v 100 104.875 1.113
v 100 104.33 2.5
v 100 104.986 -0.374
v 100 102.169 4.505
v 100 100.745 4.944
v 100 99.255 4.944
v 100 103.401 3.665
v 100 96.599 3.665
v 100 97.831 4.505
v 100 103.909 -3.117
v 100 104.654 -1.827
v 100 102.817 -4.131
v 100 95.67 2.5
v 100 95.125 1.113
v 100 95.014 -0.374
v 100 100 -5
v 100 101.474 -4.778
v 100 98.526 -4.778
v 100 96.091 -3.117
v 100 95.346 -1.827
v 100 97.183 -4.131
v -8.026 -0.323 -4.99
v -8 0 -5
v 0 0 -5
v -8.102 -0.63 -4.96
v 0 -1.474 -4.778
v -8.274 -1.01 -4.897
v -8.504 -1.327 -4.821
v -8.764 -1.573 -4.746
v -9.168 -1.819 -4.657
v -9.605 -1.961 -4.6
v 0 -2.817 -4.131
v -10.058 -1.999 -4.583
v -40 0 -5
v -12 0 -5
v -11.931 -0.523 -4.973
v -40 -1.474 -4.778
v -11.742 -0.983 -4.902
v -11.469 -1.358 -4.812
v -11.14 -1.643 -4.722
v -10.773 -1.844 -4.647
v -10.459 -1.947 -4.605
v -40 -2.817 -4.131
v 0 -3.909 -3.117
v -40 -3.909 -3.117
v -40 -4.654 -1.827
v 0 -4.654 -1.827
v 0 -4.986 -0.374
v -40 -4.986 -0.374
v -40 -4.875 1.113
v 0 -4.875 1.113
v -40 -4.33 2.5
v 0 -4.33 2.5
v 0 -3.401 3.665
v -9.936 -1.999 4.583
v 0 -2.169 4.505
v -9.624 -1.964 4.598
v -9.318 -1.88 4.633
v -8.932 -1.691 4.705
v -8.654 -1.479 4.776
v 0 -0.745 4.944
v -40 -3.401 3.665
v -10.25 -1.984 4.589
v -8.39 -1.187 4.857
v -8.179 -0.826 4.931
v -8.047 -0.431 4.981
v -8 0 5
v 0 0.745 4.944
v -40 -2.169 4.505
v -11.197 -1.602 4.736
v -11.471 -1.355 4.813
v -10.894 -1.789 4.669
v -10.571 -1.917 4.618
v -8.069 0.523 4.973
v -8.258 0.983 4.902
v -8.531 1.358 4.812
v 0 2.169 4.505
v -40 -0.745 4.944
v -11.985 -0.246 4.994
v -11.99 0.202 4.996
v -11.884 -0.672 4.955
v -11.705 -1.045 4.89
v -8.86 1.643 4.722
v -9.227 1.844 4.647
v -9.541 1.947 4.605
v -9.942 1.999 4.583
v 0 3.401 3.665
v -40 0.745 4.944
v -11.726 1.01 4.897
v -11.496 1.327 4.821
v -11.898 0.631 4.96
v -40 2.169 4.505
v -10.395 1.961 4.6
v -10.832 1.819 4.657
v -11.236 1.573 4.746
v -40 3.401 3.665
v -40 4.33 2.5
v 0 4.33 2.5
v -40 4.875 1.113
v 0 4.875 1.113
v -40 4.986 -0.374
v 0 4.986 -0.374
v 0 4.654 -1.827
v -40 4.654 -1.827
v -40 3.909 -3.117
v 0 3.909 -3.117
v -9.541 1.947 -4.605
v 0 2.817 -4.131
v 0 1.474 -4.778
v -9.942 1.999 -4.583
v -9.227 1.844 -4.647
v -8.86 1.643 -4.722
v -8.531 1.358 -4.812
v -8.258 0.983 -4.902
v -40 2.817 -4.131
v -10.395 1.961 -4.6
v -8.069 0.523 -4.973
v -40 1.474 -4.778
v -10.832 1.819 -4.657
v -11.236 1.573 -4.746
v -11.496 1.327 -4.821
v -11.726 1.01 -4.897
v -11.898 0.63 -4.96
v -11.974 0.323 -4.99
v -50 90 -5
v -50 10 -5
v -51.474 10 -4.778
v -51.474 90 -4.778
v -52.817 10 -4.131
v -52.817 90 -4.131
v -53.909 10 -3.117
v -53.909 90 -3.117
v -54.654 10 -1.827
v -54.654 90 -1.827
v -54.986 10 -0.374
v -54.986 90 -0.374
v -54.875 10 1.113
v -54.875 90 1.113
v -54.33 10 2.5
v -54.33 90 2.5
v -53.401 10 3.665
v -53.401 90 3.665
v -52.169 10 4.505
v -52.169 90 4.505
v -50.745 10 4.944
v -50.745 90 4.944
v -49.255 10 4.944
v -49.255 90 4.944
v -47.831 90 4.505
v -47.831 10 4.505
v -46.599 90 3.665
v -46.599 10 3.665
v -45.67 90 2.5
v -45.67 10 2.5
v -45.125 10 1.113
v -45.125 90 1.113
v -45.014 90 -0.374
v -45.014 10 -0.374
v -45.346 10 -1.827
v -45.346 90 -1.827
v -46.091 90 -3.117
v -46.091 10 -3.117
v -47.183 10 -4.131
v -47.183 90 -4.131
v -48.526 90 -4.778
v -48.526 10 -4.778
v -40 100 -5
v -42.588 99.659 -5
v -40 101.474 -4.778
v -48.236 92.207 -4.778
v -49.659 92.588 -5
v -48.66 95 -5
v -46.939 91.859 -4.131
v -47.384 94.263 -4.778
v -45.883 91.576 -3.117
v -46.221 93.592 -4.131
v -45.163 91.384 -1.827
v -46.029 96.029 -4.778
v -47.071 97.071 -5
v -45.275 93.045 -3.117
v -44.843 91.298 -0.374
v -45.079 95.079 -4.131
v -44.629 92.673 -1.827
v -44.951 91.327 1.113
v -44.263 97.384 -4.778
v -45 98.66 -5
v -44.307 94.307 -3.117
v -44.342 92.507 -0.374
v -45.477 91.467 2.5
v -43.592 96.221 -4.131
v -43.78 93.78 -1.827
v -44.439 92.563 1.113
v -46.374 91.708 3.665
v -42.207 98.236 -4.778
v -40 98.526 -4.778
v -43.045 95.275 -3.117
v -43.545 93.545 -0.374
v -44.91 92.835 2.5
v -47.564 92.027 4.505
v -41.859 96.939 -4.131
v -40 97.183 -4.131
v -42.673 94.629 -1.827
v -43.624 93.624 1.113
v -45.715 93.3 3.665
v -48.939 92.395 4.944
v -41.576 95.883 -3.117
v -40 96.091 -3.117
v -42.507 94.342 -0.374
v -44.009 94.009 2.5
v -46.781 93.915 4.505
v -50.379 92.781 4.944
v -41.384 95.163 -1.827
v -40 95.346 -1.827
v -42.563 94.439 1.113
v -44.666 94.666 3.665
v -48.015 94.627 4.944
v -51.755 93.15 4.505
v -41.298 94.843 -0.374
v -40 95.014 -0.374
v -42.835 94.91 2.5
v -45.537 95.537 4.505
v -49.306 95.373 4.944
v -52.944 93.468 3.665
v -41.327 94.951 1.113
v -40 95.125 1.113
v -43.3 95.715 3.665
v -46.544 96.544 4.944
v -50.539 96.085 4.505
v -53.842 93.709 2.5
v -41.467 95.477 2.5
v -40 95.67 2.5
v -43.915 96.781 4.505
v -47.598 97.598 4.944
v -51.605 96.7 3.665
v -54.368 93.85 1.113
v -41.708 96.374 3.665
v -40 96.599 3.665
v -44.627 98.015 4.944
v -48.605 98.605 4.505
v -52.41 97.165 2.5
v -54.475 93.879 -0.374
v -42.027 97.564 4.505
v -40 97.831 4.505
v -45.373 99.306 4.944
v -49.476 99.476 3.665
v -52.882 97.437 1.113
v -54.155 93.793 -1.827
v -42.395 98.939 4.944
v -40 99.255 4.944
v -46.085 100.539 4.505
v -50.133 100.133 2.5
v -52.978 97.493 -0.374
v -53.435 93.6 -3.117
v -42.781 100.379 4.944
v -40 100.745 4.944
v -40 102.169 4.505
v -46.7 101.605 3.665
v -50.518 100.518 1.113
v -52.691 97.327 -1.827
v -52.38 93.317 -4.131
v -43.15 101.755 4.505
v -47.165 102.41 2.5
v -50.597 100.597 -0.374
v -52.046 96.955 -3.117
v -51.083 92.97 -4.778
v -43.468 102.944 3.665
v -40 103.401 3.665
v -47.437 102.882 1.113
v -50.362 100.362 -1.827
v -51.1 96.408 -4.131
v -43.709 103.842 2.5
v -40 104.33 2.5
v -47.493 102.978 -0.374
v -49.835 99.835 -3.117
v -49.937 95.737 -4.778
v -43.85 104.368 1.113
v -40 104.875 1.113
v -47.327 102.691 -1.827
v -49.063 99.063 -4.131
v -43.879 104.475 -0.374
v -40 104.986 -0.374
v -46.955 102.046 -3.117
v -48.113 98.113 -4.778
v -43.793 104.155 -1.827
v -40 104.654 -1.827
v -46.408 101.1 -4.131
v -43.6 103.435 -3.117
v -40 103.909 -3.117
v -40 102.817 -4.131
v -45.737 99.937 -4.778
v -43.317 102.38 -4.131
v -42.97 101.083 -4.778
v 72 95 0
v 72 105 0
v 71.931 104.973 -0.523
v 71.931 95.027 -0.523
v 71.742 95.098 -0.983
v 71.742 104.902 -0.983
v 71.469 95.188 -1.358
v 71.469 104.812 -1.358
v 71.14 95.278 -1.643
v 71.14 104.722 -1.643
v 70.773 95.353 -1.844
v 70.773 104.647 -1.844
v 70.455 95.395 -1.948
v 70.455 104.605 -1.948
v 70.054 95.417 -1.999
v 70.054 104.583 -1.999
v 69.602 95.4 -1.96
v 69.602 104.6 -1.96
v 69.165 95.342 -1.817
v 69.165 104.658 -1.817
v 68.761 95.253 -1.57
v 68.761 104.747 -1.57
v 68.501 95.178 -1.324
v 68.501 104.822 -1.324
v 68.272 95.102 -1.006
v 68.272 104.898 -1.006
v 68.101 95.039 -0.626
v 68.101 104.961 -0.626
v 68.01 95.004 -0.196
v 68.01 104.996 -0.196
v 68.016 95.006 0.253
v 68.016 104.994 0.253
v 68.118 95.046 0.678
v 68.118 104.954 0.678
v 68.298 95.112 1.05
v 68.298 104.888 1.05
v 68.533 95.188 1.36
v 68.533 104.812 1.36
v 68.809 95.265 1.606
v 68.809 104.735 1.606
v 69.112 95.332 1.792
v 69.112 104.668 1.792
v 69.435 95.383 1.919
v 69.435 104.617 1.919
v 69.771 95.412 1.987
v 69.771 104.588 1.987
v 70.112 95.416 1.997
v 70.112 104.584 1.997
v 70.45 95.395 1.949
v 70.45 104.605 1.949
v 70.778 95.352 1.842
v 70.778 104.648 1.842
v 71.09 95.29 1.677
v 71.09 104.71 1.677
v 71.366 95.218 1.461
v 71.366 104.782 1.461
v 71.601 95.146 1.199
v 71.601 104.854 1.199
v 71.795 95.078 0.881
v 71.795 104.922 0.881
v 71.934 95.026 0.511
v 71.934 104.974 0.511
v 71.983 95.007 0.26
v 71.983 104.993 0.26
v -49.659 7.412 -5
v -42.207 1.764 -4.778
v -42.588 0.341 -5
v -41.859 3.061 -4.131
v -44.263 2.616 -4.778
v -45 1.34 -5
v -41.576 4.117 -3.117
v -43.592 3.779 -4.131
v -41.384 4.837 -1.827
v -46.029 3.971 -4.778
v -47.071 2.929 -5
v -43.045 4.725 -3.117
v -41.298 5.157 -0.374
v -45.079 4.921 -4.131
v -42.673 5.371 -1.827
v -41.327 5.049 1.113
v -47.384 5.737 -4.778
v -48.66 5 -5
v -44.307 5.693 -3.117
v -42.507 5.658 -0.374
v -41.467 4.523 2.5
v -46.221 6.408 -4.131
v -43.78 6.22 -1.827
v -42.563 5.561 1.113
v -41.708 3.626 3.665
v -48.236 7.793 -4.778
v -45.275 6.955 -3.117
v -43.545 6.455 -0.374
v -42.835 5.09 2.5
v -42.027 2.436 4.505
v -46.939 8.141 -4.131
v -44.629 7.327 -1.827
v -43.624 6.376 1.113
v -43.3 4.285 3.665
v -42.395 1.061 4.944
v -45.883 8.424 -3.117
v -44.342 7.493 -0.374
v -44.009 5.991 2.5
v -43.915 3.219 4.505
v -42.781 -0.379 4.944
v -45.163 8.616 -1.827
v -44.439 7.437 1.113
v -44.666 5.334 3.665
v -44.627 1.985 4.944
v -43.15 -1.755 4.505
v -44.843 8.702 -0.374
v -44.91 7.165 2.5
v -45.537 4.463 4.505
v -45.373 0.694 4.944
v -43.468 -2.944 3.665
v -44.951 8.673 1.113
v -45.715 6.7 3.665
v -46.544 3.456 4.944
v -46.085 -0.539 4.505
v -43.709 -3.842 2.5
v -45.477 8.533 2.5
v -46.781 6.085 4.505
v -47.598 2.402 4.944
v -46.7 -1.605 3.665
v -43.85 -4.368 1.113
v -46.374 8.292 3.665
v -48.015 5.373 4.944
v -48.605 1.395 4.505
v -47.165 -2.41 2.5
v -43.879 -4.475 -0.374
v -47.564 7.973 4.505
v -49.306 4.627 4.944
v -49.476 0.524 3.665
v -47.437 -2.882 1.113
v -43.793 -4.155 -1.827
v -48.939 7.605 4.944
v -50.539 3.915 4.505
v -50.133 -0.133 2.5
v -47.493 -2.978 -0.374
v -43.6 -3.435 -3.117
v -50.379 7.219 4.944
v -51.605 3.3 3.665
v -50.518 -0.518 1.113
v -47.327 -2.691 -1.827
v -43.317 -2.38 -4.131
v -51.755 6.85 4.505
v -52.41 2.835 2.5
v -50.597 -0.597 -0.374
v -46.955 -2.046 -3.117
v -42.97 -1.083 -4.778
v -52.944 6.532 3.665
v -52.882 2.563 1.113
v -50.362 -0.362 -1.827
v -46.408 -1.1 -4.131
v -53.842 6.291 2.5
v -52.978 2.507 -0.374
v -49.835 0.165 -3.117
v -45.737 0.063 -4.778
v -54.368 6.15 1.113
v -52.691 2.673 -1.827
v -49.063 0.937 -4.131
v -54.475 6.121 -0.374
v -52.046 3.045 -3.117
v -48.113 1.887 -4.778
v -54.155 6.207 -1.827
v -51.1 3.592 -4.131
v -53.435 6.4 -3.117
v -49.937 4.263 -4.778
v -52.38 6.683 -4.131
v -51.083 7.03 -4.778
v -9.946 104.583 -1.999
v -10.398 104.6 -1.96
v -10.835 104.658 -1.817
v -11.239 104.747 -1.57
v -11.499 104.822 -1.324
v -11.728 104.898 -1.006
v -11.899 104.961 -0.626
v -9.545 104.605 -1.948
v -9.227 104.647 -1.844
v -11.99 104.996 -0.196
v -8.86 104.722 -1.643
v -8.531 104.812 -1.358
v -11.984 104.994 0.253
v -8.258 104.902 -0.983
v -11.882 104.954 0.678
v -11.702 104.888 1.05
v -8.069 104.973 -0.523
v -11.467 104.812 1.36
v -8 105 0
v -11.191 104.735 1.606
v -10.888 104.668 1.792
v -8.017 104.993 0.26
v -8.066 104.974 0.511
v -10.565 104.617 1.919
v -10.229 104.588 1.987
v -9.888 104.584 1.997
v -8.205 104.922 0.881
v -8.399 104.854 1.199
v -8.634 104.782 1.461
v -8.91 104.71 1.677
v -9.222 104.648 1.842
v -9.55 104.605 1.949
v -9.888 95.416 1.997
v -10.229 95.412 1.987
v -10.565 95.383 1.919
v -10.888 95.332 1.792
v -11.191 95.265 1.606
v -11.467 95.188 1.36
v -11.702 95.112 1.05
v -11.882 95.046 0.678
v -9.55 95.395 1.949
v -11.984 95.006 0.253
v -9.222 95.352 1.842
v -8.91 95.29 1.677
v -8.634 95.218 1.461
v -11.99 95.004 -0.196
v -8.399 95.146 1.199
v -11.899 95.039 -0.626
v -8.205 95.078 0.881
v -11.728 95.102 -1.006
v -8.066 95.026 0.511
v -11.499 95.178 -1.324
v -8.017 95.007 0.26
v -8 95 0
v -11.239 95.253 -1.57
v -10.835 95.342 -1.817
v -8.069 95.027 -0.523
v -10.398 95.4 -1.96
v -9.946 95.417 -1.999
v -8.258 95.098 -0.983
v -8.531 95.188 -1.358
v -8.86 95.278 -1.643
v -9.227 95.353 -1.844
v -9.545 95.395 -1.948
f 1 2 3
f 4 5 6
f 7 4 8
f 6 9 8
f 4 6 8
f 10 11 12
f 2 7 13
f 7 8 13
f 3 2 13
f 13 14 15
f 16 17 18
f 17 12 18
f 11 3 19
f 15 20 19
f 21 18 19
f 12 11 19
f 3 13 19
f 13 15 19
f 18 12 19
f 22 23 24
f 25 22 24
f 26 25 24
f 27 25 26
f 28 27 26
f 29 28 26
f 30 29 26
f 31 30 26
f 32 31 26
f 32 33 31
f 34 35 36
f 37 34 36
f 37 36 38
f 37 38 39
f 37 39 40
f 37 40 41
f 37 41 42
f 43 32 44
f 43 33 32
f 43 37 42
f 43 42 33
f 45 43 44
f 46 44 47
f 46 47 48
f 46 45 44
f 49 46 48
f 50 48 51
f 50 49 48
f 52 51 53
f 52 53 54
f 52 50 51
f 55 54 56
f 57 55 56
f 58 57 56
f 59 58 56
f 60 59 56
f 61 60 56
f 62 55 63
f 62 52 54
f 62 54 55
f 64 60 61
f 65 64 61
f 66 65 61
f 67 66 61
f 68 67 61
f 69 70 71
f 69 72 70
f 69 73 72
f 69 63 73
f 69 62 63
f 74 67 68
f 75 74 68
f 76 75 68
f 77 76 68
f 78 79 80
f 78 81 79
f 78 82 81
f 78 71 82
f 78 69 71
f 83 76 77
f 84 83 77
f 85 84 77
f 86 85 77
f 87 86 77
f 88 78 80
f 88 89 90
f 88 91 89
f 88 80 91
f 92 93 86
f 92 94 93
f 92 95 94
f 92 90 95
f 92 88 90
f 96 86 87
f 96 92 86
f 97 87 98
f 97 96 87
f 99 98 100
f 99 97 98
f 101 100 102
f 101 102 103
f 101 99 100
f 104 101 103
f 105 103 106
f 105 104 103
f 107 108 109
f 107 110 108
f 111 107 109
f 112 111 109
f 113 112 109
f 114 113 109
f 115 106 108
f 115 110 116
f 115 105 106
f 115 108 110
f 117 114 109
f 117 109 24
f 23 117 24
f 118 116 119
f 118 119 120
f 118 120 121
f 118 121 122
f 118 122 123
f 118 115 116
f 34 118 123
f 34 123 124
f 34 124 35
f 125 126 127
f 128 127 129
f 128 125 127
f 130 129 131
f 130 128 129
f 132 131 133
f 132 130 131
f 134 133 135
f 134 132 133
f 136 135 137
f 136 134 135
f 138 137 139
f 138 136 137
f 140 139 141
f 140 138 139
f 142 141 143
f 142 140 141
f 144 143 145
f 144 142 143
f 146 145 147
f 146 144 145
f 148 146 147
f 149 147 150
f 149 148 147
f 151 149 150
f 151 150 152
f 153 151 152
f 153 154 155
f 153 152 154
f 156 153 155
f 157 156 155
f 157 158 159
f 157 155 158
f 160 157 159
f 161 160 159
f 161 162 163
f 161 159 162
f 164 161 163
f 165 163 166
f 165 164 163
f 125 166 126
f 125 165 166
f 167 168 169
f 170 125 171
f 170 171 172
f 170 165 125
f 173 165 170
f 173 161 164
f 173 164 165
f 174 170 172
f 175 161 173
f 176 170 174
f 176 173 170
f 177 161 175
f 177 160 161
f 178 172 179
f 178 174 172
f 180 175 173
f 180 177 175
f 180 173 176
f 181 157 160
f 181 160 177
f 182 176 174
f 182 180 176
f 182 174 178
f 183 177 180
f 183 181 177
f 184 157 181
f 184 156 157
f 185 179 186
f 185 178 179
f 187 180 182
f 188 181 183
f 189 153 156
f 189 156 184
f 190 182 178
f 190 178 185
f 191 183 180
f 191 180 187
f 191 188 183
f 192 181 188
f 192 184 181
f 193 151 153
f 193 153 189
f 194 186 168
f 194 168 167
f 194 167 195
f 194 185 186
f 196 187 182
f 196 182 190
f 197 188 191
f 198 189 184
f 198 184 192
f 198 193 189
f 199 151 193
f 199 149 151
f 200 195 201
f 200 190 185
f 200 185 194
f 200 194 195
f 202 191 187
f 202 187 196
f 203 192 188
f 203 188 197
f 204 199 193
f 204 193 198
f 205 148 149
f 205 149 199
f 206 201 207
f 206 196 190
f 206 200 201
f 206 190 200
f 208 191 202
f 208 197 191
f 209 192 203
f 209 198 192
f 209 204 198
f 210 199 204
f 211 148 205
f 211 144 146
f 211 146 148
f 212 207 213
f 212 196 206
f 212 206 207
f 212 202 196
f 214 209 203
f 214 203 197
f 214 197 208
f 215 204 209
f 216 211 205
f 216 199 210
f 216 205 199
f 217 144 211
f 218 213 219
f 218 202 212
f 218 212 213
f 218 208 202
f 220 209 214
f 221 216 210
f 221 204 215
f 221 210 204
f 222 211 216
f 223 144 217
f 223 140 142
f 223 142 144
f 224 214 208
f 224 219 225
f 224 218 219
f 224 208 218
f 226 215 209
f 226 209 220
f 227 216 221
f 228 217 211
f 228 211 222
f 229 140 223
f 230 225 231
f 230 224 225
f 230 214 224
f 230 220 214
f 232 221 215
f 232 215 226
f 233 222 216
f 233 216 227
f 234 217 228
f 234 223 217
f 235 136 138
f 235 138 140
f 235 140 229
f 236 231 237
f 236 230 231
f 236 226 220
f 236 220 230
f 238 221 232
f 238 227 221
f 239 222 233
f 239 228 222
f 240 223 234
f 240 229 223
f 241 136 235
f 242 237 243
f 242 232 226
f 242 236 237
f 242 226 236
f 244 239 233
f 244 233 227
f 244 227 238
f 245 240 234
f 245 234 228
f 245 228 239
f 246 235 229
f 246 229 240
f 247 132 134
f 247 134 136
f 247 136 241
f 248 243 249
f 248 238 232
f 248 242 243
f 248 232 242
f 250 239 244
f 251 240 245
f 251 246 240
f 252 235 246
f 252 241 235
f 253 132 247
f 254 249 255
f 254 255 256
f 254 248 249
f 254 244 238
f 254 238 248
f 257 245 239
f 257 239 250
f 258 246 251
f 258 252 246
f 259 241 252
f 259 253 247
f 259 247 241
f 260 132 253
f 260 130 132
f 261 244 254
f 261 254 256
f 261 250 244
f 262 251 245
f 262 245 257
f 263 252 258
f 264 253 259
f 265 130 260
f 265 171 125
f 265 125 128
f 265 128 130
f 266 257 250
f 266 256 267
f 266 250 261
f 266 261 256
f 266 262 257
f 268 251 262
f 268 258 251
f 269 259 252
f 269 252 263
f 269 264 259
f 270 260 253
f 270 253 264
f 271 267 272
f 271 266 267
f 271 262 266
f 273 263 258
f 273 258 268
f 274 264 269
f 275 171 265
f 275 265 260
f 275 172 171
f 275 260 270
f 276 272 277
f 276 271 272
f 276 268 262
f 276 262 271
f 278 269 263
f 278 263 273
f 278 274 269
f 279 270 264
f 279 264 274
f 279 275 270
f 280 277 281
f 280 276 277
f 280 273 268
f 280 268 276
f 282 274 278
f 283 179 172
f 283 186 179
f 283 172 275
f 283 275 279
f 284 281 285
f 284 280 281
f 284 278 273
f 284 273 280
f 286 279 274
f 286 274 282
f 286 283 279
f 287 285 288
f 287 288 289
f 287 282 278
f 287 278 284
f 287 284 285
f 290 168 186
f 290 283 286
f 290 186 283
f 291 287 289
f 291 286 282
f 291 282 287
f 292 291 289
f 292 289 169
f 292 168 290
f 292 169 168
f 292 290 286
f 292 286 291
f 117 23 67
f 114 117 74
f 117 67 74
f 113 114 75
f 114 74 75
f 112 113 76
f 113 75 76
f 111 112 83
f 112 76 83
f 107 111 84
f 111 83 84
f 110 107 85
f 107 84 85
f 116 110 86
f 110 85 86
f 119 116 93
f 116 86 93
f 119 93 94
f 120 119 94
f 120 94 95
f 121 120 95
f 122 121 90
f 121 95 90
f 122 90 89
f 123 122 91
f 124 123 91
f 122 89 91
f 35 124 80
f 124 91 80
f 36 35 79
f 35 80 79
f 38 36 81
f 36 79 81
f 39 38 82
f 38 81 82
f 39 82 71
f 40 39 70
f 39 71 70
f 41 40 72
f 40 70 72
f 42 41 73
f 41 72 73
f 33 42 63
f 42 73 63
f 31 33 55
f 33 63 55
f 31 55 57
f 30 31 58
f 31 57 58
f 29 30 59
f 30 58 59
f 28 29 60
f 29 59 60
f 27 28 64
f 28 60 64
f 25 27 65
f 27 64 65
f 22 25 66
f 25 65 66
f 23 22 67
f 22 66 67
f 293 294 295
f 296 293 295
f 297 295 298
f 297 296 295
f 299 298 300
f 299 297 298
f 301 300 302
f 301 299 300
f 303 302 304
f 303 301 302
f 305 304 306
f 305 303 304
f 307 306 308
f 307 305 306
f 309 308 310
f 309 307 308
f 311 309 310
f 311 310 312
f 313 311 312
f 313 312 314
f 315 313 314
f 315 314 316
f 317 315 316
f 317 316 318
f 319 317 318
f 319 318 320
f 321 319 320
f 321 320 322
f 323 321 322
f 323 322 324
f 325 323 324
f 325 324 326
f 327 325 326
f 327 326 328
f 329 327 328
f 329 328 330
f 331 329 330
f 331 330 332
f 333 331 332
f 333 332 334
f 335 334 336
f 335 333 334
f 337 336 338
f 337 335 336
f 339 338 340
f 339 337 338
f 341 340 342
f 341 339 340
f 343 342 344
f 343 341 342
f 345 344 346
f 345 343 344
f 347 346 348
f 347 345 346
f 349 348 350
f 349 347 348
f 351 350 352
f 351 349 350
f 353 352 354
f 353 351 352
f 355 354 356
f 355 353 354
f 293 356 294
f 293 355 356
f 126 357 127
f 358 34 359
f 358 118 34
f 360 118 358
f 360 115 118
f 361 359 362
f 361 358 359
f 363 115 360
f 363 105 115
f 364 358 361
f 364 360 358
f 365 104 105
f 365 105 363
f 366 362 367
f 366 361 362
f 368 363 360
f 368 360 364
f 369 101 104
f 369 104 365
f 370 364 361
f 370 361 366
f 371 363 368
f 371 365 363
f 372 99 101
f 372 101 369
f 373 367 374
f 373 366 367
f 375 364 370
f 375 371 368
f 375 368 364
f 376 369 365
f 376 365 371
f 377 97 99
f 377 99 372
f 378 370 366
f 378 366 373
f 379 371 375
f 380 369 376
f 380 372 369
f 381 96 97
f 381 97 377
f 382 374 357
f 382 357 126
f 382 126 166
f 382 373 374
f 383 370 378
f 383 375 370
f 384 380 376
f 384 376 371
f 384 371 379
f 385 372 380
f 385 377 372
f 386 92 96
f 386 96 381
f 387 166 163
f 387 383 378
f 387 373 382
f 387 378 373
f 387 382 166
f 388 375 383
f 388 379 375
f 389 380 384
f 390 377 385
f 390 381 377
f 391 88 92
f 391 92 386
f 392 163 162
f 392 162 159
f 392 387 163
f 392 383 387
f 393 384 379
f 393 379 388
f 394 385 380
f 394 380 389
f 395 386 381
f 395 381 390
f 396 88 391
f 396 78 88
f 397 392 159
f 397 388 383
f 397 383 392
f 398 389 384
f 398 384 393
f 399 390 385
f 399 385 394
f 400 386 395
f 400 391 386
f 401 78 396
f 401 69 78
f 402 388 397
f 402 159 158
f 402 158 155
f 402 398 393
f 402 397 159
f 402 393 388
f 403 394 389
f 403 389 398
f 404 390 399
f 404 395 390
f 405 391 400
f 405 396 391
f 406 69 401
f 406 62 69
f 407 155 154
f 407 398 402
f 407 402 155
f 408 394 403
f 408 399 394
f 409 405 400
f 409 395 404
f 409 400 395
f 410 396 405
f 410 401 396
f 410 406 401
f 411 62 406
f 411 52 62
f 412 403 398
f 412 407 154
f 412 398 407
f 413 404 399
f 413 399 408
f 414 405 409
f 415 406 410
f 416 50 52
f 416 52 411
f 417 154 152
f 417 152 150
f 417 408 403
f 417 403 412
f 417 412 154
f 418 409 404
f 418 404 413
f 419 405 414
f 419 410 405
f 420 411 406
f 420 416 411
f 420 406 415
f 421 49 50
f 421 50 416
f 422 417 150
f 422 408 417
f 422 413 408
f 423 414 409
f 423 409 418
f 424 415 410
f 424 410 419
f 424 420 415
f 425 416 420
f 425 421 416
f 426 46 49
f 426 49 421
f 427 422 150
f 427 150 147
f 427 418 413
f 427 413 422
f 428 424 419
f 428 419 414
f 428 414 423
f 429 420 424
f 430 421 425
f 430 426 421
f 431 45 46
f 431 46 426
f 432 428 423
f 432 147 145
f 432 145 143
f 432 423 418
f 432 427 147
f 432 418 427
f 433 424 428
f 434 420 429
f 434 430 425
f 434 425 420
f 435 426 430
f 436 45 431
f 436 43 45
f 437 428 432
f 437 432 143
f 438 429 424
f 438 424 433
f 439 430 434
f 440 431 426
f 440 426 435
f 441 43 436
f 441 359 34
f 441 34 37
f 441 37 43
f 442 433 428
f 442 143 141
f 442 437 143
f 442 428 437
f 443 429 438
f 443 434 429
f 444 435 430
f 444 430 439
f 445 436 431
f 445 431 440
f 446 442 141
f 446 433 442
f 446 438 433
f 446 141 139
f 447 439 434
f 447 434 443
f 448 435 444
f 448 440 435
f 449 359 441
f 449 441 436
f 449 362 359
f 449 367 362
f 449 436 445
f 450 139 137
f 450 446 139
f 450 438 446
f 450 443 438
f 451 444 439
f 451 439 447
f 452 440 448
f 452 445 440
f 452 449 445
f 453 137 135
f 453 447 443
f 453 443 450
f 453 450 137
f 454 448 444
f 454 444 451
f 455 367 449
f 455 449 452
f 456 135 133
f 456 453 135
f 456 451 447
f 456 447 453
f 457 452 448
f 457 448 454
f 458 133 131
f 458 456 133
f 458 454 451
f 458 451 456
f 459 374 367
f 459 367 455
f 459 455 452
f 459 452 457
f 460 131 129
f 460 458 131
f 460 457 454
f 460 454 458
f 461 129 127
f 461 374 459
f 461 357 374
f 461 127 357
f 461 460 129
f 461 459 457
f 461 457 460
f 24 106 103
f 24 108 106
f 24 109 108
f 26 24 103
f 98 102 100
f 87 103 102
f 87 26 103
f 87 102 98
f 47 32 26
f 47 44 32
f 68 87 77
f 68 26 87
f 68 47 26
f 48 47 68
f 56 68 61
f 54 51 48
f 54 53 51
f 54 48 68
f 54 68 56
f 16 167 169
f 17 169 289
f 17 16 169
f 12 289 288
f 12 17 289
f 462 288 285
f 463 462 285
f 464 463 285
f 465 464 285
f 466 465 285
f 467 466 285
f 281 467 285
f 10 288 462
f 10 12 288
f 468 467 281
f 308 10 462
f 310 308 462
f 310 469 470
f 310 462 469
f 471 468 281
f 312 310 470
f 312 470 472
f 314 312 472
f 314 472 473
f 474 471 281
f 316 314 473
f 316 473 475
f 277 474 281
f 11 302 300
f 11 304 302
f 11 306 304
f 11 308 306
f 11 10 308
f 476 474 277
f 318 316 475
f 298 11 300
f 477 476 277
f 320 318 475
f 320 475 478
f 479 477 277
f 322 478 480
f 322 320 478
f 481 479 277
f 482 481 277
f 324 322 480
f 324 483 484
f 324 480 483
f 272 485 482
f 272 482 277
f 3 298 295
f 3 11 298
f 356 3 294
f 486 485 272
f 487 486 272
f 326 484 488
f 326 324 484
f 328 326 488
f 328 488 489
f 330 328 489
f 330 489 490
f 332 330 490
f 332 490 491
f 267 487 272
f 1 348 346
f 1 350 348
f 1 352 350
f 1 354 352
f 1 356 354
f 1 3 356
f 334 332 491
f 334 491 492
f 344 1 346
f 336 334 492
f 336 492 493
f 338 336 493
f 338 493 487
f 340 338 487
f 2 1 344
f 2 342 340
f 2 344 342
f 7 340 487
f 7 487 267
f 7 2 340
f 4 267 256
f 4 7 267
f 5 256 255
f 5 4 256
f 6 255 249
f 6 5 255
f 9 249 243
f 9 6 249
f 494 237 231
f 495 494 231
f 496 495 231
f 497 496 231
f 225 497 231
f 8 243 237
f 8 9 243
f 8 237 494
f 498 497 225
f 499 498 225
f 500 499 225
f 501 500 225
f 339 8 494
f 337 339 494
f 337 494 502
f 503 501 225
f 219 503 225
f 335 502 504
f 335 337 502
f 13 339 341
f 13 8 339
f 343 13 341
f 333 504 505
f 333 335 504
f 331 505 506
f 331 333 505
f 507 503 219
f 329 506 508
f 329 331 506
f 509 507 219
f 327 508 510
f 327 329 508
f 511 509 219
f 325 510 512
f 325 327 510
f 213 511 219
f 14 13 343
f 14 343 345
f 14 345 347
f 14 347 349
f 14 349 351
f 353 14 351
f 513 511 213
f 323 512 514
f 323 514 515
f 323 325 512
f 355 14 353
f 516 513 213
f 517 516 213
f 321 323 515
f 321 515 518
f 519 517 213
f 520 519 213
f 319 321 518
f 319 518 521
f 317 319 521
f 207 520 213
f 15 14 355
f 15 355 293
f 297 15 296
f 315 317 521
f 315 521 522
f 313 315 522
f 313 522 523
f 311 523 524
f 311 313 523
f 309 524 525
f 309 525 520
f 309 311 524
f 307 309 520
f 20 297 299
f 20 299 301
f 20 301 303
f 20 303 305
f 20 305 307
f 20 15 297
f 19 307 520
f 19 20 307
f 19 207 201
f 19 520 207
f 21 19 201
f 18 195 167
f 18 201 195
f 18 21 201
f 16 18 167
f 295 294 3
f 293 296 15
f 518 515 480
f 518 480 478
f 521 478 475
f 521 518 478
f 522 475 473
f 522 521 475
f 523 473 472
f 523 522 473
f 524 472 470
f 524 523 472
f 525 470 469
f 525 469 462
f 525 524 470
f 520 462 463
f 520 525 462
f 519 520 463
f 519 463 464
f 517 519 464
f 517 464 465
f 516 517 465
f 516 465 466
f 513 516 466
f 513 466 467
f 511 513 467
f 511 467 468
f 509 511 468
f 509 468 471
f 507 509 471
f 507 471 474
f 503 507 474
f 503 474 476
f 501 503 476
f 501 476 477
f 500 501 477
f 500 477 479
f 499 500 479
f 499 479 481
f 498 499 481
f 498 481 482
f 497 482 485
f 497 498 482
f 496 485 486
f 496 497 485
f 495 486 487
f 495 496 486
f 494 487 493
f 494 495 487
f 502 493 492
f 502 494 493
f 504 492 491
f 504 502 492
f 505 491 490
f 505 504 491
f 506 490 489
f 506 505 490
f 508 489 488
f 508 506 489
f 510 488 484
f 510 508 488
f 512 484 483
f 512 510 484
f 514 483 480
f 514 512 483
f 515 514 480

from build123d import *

# Parameters (mm, degrees)
SKETCH_3_R               = 5
CUT_EXTRUDE_1_DEPTH      = 10
CUT_EXTRUDE_1_DEPTH_BACK = 10
SKETCH_4_R               = 2
SKETCH_6_R               = 2
CUT_EXTRUDE_3_DEPTH      = 129


with BuildPart() as part:
    # 扫描1: sweep along a path in 草图1
    with BuildLine(Plane.XY) as sweep_1_path:
        Line((0, 0), (-40, 0))
        ThreePointArc((-40, 0), (-47.071067812, 2.928932188), (-50, 10))
        Line((-50, 10), (-50, 90))
        ThreePointArc((-50, 90), (-47.071067812, 97.071067812), (-40, 100))
        Line((-40, 100), (100, 100))
    # 草图3 → 扫描1 (sweep)
    with BuildSketch(Plane(origin=(0, 0, 0), x_dir=(0, 0, -1), z_dir=(1, 0, 0))):
        Circle(SKETCH_3_R)
    sweep(path=sweep_1_path.line)

    # 草图4 → 切除-拉伸1 (cut, two sides: drawn at the far end of the back side and taken through both)
    with BuildSketch(Plane.XY.offset(-CUT_EXTRUDE_1_DEPTH_BACK)):
        with Locations((-10, 0)):
            Circle(SKETCH_4_R)
    extrude(amount=CUT_EXTRUDE_1_DEPTH + CUT_EXTRUDE_1_DEPTH_BACK, mode=Mode.SUBTRACT)

    # 草图6 → 切除-拉伸3 (cut)
    with BuildSketch(Plane(origin=(0, 70, 0), x_dir=(1, 0, 0), z_dir=(0, 1, 0))):
        with Locations((70, 0)):
            Circle(SKETCH_6_R)
        with Locations((-10, 0)):
            Circle(SKETCH_6_R)
    extrude(amount=CUT_EXTRUDE_3_DEPTH, mode=Mode.SUBTRACT)


solid = part.part
